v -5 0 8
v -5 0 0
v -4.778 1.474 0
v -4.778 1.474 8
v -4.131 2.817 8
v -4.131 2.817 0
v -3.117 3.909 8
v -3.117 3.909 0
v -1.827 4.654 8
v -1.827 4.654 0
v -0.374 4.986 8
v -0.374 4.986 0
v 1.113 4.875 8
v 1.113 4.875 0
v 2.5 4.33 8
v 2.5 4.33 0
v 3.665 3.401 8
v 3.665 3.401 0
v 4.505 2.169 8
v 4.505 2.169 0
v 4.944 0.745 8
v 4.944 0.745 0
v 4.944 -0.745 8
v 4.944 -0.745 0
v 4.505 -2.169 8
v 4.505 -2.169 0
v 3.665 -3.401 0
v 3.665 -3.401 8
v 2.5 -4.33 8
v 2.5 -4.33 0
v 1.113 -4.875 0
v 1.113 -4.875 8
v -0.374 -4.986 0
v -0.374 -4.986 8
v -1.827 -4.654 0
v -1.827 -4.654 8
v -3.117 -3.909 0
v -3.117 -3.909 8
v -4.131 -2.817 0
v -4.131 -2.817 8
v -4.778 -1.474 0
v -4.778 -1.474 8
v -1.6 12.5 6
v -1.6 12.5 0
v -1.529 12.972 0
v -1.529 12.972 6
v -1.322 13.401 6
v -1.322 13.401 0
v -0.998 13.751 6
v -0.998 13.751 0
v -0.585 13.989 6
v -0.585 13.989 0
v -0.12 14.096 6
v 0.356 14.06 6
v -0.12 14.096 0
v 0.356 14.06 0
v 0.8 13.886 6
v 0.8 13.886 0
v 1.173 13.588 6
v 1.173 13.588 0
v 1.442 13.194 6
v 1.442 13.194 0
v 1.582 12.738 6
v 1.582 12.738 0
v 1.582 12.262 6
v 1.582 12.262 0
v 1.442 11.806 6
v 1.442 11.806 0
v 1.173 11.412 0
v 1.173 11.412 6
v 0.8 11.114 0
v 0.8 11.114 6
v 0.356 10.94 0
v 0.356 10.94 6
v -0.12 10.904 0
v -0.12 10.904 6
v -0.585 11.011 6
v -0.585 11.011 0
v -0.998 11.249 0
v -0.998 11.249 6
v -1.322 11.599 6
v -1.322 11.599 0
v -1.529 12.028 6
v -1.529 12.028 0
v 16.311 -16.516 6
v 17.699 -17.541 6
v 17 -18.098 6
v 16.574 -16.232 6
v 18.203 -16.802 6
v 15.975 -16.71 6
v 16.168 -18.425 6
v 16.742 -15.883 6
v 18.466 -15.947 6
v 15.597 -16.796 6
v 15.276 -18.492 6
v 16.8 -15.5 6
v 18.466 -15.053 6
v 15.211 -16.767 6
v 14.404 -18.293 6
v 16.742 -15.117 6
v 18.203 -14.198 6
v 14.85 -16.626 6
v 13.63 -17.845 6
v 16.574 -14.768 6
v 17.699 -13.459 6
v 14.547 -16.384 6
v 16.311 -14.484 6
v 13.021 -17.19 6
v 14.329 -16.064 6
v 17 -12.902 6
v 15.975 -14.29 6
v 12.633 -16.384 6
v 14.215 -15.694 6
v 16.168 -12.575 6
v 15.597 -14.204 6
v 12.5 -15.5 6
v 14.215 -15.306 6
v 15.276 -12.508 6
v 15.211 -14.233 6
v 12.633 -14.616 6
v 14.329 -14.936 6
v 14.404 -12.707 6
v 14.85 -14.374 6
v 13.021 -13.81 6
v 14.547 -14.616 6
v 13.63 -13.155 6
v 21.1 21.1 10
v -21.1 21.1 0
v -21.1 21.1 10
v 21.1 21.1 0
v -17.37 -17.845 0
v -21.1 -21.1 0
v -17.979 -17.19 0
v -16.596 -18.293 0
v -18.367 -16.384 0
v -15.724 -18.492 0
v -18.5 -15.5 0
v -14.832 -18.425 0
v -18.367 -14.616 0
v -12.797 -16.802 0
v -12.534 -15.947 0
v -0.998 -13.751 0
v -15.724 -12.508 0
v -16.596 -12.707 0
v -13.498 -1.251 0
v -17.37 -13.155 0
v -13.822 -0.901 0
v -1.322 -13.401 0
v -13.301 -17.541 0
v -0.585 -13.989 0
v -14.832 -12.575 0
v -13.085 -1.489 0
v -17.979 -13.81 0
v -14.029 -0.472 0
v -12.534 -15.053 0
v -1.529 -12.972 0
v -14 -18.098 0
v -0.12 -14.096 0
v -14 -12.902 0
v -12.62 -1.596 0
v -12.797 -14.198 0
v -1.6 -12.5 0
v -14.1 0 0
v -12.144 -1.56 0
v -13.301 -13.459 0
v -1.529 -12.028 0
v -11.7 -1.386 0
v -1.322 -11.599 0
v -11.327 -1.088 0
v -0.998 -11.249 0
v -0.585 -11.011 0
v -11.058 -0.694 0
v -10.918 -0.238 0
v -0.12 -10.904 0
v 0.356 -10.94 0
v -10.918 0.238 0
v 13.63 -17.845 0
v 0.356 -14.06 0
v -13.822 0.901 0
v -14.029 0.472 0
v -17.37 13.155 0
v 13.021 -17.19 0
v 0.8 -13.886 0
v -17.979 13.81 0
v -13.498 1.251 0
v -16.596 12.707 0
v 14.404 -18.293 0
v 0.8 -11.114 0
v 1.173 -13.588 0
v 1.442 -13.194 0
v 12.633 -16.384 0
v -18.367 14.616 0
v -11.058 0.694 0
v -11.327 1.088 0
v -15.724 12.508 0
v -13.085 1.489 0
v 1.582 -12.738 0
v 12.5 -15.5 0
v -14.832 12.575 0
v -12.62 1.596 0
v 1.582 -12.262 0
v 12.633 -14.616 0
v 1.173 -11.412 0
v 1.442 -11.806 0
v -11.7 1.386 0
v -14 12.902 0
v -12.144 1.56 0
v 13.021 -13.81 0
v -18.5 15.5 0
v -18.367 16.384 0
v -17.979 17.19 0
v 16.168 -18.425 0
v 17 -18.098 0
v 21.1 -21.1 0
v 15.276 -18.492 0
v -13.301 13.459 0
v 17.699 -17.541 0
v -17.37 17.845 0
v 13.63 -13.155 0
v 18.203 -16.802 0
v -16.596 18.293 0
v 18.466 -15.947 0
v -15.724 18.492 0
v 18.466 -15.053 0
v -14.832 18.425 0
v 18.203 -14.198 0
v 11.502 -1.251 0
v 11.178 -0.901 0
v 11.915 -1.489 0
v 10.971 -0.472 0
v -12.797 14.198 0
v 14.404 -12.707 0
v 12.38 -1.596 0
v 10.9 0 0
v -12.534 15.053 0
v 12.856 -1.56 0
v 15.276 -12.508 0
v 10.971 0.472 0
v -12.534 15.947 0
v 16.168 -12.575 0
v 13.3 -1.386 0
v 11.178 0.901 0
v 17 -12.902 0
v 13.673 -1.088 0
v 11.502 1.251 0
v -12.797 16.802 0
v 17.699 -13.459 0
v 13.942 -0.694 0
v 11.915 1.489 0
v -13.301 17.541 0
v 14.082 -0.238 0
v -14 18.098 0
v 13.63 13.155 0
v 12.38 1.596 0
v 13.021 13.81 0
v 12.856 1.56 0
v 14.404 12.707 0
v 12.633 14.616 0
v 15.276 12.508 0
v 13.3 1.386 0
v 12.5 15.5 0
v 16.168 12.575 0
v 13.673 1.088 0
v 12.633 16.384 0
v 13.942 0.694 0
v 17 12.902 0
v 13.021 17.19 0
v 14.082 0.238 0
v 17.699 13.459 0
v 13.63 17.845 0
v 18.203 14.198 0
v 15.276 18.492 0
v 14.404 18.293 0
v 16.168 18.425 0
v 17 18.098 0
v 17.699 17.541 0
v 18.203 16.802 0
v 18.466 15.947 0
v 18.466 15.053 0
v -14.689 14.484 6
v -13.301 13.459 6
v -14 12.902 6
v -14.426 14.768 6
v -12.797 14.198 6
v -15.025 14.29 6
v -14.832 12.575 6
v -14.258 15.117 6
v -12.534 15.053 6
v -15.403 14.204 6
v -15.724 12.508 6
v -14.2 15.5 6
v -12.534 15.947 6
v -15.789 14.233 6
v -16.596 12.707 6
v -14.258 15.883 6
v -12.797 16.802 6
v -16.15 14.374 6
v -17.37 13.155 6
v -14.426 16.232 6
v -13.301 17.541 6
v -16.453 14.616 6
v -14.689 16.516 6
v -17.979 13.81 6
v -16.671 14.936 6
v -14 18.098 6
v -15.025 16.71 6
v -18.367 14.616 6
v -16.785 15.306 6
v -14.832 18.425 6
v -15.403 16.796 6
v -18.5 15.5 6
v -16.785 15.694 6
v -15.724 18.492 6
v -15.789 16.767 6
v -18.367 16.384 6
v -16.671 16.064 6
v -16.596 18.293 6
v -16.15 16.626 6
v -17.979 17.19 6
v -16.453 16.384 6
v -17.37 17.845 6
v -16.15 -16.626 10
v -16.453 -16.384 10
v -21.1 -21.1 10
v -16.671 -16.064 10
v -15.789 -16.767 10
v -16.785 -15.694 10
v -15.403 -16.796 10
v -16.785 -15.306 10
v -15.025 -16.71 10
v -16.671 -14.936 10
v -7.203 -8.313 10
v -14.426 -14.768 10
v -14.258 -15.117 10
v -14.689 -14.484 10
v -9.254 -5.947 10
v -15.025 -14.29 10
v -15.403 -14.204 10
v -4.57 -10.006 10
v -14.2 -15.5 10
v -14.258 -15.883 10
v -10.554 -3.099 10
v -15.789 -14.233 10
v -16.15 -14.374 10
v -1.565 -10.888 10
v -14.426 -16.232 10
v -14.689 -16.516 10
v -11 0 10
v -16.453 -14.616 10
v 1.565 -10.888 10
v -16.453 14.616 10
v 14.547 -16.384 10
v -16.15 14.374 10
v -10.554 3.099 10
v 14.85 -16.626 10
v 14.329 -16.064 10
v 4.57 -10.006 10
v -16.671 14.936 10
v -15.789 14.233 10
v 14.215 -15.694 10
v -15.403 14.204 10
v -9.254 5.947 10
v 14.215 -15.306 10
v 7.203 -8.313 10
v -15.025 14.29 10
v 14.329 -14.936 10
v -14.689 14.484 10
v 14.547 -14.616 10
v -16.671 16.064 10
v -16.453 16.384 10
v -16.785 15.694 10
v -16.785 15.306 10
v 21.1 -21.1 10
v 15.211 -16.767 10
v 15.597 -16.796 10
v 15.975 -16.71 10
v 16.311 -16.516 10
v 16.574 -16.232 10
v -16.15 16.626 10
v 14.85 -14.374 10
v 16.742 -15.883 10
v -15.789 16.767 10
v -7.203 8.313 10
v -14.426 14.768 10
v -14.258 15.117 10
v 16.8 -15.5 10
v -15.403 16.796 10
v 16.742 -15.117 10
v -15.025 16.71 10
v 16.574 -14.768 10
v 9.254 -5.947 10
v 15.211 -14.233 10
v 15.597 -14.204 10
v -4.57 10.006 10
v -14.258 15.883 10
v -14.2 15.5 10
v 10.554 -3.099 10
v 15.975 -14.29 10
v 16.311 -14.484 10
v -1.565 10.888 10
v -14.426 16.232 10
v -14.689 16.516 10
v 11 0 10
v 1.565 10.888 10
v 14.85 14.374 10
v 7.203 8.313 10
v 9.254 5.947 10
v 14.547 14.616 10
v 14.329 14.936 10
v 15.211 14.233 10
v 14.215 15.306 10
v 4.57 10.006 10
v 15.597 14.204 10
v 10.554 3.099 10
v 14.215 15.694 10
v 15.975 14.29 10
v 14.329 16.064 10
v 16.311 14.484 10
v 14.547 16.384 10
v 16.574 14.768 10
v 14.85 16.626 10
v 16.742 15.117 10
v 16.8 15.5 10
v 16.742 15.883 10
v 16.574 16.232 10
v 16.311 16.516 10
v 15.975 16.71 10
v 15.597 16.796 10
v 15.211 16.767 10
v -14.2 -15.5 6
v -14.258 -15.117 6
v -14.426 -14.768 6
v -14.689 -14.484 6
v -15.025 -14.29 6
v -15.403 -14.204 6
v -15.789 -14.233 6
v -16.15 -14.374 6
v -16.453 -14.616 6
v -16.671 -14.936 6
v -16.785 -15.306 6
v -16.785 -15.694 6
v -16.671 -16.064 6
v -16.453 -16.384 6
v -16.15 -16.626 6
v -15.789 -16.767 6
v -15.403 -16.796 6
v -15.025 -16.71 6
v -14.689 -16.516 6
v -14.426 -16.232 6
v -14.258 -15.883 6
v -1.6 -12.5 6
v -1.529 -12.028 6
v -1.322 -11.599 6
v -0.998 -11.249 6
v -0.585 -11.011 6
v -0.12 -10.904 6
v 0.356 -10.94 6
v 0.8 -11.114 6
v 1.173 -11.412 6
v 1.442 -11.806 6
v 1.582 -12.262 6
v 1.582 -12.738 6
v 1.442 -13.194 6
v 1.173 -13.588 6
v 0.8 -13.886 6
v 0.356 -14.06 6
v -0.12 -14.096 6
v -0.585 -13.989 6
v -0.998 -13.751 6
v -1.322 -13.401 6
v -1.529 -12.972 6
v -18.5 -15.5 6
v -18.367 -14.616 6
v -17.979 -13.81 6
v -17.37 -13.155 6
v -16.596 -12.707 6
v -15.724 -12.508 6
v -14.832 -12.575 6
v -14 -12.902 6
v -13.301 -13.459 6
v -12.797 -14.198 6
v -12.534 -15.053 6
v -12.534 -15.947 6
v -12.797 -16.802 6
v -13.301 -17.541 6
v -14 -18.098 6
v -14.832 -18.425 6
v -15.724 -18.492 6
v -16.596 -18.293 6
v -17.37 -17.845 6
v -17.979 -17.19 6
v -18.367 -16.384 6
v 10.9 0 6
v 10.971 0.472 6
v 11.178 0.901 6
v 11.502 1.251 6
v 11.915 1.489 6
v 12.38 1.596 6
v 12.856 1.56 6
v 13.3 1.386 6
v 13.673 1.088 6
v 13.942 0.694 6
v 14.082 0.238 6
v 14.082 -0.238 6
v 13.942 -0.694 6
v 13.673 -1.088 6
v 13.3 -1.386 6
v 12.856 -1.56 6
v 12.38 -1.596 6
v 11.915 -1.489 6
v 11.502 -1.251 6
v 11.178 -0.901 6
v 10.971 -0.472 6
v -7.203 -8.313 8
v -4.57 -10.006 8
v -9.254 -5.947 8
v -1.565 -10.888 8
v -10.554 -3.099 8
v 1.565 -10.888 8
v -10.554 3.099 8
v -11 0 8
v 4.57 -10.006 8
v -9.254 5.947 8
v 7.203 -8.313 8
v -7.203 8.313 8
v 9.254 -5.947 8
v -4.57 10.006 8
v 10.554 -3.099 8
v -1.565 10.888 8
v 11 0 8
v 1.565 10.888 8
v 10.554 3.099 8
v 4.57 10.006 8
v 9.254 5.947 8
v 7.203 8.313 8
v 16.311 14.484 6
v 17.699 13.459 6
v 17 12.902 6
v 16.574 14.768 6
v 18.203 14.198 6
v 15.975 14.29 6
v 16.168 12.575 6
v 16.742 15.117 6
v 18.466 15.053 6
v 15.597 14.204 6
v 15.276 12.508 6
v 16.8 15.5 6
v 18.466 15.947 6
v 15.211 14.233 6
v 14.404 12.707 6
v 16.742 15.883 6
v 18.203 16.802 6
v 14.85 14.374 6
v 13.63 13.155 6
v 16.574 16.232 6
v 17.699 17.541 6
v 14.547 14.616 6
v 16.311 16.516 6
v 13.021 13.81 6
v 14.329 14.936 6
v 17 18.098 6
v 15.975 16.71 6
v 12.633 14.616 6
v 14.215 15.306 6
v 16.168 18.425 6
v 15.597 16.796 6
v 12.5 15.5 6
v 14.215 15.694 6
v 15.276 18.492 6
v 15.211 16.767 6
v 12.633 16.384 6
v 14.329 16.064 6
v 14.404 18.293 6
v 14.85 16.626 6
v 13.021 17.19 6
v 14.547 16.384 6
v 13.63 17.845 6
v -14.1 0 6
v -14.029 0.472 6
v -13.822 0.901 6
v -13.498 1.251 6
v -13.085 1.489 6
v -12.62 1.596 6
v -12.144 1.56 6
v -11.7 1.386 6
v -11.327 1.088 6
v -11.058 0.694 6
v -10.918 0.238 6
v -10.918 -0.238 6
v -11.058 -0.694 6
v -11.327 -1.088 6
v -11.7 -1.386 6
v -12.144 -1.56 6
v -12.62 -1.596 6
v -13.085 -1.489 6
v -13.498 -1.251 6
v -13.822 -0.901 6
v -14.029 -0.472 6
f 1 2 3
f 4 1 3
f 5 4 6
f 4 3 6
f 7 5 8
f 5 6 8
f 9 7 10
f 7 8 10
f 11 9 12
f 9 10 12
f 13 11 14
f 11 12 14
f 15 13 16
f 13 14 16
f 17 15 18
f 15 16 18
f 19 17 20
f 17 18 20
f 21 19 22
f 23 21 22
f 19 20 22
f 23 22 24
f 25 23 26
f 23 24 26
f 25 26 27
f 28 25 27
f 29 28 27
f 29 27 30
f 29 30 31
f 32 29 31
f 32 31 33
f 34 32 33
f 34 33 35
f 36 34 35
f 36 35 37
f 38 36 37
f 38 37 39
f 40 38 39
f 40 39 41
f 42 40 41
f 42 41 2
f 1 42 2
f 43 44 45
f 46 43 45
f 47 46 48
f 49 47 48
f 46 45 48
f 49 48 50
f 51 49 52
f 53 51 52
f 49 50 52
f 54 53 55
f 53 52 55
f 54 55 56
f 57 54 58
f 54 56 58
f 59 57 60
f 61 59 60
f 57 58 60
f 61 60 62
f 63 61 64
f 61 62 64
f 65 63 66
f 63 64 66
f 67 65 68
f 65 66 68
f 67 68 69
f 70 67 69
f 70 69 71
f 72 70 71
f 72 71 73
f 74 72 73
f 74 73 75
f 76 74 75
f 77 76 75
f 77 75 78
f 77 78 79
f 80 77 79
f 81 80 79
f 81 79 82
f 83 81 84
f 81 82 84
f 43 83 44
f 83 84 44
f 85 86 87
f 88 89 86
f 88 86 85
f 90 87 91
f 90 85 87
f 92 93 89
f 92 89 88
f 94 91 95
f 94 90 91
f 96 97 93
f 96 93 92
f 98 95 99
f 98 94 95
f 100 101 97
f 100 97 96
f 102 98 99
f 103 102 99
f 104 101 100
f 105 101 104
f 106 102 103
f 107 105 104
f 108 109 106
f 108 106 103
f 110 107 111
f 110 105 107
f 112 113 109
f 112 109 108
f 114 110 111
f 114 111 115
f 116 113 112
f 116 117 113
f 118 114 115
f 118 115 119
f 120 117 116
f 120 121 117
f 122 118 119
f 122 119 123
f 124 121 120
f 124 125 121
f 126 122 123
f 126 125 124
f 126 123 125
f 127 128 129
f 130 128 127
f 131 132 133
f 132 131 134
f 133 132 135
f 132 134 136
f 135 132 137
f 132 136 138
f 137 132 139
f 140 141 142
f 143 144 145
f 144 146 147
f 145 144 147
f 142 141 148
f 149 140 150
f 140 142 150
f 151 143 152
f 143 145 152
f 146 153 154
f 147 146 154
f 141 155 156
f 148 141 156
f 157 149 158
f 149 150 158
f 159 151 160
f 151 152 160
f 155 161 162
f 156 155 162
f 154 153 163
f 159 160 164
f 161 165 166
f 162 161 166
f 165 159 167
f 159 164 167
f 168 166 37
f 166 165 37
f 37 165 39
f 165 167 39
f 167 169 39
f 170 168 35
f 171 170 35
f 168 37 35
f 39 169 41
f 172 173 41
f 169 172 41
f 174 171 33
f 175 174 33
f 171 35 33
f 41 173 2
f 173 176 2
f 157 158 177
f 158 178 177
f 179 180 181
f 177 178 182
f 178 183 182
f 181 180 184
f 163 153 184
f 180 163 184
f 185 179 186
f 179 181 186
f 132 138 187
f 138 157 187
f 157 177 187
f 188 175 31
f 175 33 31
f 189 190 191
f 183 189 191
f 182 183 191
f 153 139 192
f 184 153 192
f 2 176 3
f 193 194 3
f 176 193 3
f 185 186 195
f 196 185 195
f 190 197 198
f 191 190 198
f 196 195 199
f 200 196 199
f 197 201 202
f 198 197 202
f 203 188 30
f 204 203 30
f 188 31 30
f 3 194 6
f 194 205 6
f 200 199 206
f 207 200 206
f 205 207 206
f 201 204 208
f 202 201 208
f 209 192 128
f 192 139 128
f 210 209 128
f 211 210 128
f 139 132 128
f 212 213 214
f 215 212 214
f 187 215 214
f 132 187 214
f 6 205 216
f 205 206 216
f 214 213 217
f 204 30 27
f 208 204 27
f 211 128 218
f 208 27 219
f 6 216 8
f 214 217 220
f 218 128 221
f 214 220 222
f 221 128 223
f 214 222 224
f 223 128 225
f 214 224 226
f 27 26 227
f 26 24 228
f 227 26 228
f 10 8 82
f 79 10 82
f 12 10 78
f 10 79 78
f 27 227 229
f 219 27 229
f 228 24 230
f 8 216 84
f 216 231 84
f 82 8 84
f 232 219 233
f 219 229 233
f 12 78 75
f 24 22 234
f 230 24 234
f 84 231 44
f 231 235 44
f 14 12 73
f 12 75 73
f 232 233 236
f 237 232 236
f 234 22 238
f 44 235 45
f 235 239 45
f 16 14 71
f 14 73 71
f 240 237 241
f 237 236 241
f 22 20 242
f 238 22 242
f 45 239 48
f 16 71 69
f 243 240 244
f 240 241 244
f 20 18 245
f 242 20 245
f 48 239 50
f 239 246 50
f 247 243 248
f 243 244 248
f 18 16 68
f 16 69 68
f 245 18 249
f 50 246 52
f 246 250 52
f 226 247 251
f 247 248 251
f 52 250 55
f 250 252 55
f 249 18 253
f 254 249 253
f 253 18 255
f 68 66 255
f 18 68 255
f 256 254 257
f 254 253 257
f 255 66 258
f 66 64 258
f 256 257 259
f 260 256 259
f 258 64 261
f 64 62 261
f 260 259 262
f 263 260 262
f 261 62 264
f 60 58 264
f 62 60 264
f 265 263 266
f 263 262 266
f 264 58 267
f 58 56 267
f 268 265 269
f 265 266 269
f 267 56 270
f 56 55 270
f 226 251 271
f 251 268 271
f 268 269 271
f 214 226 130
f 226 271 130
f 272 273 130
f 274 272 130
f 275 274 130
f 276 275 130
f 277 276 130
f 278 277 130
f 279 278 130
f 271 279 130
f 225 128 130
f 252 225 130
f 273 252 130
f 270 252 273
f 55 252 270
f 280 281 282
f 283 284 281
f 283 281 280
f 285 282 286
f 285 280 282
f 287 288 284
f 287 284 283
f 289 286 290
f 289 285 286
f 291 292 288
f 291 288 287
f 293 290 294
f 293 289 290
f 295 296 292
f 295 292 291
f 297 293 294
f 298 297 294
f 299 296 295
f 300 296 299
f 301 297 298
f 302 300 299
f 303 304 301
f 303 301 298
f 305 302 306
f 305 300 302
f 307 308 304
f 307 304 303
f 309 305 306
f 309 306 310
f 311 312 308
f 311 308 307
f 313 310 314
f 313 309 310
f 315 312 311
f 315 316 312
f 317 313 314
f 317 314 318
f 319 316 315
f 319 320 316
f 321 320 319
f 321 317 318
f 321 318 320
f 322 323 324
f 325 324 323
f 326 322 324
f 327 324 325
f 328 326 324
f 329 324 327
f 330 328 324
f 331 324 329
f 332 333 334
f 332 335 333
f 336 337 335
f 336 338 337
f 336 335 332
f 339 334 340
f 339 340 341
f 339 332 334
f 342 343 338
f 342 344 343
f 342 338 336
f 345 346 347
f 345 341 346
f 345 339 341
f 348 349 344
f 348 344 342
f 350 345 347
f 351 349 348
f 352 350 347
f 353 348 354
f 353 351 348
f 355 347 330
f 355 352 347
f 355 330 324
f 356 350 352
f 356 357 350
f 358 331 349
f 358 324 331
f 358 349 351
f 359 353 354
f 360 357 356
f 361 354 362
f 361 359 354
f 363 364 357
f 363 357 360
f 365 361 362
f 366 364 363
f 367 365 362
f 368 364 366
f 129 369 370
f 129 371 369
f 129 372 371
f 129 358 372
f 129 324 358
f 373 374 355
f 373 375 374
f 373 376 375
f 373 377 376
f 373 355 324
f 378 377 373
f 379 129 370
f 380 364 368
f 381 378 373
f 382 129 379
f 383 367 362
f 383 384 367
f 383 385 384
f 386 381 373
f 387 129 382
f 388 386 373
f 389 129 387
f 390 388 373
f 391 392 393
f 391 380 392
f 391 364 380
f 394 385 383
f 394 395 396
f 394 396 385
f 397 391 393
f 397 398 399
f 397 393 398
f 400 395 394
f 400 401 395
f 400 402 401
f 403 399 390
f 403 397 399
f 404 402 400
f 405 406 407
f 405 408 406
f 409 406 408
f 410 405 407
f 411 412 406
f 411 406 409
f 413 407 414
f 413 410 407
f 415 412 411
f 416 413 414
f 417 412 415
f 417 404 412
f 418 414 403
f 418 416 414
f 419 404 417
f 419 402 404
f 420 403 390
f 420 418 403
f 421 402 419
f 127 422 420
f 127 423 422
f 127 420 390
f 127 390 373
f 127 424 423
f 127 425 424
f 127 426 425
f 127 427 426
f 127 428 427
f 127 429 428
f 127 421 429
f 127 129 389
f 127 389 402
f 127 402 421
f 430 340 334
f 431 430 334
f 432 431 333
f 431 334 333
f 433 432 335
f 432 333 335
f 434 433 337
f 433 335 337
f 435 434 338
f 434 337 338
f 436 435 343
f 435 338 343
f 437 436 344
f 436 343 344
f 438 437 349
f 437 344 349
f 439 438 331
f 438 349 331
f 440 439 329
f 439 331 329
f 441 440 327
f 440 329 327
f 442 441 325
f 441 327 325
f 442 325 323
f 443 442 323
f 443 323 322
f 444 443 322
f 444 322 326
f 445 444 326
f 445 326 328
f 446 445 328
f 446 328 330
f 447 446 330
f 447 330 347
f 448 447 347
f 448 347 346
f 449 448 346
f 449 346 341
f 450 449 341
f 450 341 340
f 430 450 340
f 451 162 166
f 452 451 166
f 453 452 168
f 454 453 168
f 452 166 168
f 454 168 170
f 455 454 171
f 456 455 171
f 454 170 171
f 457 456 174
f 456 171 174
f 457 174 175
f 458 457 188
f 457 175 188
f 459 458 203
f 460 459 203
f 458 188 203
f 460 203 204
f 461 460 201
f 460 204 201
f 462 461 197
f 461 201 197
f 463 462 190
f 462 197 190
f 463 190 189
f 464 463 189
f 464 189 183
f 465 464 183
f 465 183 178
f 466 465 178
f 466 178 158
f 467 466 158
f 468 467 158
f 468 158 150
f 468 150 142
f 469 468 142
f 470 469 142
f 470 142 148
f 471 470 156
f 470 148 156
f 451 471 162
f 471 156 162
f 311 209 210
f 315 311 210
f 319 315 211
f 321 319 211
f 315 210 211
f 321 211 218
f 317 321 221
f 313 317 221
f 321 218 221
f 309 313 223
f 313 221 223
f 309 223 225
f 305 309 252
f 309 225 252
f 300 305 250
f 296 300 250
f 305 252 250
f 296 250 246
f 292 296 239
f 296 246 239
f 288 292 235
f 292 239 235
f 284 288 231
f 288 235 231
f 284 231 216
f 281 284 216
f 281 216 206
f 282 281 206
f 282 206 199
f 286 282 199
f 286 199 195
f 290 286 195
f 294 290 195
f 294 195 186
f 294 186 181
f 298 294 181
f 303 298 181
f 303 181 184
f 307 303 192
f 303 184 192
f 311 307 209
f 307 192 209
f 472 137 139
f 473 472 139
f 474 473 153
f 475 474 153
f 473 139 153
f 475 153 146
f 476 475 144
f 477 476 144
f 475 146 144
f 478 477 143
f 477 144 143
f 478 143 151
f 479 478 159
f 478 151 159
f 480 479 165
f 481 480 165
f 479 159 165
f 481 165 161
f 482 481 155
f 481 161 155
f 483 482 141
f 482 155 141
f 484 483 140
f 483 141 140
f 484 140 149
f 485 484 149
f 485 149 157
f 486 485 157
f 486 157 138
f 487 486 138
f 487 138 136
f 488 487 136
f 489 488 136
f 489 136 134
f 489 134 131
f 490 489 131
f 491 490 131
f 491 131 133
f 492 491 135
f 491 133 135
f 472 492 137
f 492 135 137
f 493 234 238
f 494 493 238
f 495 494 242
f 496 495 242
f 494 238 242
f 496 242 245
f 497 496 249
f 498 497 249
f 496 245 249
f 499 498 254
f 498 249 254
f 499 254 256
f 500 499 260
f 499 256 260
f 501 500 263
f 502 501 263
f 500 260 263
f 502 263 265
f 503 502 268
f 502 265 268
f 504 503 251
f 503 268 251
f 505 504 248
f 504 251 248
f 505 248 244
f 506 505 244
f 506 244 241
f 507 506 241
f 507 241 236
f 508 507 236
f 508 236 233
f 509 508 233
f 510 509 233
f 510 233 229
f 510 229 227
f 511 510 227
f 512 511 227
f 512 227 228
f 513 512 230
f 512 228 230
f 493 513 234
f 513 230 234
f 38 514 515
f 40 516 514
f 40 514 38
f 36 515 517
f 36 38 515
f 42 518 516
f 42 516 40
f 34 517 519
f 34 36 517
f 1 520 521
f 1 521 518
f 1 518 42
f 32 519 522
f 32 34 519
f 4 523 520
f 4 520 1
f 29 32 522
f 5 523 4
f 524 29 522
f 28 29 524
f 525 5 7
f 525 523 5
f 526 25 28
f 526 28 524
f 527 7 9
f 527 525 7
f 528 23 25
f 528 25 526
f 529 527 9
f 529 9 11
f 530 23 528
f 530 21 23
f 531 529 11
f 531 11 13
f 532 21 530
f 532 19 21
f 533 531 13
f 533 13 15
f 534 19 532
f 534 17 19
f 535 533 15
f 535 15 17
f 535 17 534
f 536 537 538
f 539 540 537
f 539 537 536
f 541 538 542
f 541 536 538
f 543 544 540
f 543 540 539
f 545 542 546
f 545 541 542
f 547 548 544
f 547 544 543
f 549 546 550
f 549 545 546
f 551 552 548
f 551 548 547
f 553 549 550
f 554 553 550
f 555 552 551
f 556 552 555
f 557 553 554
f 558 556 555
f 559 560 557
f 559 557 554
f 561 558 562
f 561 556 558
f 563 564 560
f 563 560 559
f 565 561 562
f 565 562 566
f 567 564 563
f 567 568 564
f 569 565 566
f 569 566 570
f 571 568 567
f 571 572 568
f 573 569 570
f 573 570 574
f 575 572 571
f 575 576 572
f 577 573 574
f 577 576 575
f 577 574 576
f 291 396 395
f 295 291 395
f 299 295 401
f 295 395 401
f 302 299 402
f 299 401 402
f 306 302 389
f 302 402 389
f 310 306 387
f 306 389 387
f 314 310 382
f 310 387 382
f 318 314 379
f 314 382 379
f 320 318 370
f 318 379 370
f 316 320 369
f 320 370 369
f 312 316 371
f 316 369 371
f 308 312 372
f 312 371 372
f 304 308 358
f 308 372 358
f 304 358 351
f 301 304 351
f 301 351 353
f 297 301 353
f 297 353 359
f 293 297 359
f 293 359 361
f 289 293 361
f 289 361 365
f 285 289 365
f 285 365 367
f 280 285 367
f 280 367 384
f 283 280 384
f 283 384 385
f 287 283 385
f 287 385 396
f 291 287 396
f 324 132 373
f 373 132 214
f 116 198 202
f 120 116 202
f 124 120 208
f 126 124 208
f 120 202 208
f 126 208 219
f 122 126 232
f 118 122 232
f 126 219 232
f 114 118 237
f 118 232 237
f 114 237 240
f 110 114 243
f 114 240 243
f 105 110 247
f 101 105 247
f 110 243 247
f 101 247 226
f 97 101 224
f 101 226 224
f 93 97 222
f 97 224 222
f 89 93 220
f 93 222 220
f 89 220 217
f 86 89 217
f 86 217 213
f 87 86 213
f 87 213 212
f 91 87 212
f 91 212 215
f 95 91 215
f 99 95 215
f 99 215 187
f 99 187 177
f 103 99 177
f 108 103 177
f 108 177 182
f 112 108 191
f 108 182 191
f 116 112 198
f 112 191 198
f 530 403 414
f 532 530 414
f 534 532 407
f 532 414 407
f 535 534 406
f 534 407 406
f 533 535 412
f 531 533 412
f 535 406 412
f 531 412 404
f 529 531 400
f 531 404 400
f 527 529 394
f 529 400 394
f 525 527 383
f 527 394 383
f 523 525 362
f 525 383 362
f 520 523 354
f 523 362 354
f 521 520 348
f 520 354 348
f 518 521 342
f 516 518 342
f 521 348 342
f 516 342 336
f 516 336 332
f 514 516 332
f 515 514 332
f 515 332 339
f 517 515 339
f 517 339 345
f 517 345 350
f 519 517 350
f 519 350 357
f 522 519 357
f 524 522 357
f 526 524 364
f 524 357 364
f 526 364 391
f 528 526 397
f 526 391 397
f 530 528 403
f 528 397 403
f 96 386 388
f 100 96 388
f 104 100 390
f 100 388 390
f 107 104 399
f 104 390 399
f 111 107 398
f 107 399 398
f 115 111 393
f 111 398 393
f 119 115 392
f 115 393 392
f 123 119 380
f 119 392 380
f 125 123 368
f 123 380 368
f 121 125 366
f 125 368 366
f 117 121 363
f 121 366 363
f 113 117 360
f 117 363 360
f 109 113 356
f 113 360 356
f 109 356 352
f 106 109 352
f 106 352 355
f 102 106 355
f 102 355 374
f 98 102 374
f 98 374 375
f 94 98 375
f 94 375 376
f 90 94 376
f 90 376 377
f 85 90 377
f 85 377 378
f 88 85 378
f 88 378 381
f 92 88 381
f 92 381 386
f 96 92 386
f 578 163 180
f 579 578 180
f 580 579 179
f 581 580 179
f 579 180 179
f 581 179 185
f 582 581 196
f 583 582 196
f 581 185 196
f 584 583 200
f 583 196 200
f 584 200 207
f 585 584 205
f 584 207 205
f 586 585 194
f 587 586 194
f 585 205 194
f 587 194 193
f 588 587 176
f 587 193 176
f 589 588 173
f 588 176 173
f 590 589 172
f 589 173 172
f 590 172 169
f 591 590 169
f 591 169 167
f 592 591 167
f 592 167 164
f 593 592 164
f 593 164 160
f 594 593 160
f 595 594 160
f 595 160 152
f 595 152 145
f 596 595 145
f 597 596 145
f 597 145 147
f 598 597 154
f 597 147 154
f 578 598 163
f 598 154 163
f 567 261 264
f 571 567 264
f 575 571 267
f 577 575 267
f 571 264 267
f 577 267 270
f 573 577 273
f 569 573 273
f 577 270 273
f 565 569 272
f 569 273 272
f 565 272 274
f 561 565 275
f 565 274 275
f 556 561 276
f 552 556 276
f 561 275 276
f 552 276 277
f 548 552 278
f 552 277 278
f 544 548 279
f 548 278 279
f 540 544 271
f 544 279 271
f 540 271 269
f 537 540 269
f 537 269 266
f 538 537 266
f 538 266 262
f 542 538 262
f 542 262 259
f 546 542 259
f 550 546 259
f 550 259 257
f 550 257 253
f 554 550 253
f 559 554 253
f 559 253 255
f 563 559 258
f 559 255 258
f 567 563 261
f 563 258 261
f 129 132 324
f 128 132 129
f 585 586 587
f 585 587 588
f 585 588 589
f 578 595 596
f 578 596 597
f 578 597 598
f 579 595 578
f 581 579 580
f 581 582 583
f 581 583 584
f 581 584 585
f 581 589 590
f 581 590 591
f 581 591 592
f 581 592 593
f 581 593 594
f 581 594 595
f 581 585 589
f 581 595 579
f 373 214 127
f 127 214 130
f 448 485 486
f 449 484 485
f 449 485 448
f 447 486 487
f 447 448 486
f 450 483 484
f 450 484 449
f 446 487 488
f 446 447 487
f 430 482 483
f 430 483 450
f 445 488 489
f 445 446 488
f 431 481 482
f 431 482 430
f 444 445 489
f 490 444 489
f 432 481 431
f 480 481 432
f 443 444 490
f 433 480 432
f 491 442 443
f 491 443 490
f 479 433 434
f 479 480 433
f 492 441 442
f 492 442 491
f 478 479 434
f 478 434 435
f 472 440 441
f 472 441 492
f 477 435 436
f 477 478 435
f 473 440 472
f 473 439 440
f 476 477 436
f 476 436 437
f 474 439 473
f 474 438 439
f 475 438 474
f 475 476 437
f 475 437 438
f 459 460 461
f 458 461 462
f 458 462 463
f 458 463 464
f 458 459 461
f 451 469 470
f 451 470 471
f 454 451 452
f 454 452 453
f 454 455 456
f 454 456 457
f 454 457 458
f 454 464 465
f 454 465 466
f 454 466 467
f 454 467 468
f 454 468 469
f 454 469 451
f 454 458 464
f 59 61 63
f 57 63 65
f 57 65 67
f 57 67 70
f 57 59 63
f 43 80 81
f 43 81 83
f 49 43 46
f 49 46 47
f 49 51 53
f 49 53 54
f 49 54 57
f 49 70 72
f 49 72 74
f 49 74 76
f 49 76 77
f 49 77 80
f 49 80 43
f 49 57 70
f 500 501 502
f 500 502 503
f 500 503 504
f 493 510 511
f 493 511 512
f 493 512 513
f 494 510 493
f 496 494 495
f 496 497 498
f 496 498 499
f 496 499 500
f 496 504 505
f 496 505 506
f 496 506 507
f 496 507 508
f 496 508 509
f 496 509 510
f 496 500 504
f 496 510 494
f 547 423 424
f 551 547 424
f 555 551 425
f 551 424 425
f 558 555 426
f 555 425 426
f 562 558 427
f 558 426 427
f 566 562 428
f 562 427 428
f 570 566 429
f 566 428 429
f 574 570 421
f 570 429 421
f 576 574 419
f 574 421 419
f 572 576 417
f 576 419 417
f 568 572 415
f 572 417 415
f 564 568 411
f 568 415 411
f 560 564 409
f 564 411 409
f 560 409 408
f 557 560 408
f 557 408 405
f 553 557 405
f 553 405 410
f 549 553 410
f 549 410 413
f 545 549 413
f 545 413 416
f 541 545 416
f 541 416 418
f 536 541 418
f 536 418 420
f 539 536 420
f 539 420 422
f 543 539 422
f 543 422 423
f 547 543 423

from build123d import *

# Parameters (mm, degrees)
SKETCH_1_W          = 42.2
SKETCH_1_H          = 42.2
EXTRUDE_1_DEPTH     = 10
SKETCH_2_R          = 1.6
SKETCH_2_R_2        = 3
CUT_EXTRUDE_1_DEPTH = 6
SKETCH_3_R          = 11
CUT_EXTRUDE_2_DEPTH = 2
SKETCH_4_R          = 5
CUT_EXTRUDE_3_DEPTH = 11
SKETCH_5_R          = 1.3
CUT_EXTRUDE_4_DEPTH = 11


with BuildPart() as part:
    # 草图1 → 凸台-拉伸1 (new body)
    with BuildSketch(Plane.XY):
        Rectangle(SKETCH_1_W, SKETCH_1_H)
    extrude(amount=EXTRUDE_1_DEPTH)

    # 草图2 → 切除-拉伸1 (cut)
    with BuildSketch(Plane(origin=(0, 0, 0), x_dir=(-1, 0, 0), z_dir=(0, 0, -1))):
        with Locations((12.5, 0)):
            Circle(SKETCH_2_R)
        with Locations((0, -12.5)):
            Circle(SKETCH_2_R)
        with Locations((-12.5, 0)):
            Circle(SKETCH_2_R)
        with Locations((0, 12.5)):
            Circle(SKETCH_2_R)
        with Locations((-15.5, 15.5)):
            Circle(SKETCH_2_R_2)
        with Locations((15.5, 15.5)):
            Circle(SKETCH_2_R_2)
        with Locations((15.5, -15.5)):
            Circle(SKETCH_2_R_2)
        with Locations((-15.5, -15.5)):
            Circle(SKETCH_2_R_2)
    extrude(amount=-CUT_EXTRUDE_1_DEPTH, mode=Mode.SUBTRACT)

    # 草图3 → 切除-拉伸2 (cut)
    with BuildSketch(Plane.XY.offset(10)):
        Circle(SKETCH_3_R)
    extrude(amount=-CUT_EXTRUDE_2_DEPTH, mode=Mode.SUBTRACT)

    # 草图4 → 切除-拉伸3 (cut, through all)
    with BuildSketch(Plane(origin=(0, 0, 0), x_dir=(-1, 0, 0), z_dir=(0, 0, -1))):
        Circle(SKETCH_4_R)
    extrude(amount=-CUT_EXTRUDE_3_DEPTH, mode=Mode.SUBTRACT)

    # 草图5 → 切除-拉伸4 (cut, through all)
    with BuildSketch(Plane.XY.offset(10)):
        with Locations((15.5, -15.5)):
            Circle(SKETCH_5_R)
        with Locations((-15.5, -15.5)):
            Circle(SKETCH_5_R)
        with Locations((-15.5, 15.5)):
            Circle(SKETCH_5_R)
        with Locations((15.5, 15.5)):
            Circle(SKETCH_5_R)
    extrude(amount=-CUT_EXTRUDE_4_DEPTH, mode=Mode.SUBTRACT)


solid = part.part
